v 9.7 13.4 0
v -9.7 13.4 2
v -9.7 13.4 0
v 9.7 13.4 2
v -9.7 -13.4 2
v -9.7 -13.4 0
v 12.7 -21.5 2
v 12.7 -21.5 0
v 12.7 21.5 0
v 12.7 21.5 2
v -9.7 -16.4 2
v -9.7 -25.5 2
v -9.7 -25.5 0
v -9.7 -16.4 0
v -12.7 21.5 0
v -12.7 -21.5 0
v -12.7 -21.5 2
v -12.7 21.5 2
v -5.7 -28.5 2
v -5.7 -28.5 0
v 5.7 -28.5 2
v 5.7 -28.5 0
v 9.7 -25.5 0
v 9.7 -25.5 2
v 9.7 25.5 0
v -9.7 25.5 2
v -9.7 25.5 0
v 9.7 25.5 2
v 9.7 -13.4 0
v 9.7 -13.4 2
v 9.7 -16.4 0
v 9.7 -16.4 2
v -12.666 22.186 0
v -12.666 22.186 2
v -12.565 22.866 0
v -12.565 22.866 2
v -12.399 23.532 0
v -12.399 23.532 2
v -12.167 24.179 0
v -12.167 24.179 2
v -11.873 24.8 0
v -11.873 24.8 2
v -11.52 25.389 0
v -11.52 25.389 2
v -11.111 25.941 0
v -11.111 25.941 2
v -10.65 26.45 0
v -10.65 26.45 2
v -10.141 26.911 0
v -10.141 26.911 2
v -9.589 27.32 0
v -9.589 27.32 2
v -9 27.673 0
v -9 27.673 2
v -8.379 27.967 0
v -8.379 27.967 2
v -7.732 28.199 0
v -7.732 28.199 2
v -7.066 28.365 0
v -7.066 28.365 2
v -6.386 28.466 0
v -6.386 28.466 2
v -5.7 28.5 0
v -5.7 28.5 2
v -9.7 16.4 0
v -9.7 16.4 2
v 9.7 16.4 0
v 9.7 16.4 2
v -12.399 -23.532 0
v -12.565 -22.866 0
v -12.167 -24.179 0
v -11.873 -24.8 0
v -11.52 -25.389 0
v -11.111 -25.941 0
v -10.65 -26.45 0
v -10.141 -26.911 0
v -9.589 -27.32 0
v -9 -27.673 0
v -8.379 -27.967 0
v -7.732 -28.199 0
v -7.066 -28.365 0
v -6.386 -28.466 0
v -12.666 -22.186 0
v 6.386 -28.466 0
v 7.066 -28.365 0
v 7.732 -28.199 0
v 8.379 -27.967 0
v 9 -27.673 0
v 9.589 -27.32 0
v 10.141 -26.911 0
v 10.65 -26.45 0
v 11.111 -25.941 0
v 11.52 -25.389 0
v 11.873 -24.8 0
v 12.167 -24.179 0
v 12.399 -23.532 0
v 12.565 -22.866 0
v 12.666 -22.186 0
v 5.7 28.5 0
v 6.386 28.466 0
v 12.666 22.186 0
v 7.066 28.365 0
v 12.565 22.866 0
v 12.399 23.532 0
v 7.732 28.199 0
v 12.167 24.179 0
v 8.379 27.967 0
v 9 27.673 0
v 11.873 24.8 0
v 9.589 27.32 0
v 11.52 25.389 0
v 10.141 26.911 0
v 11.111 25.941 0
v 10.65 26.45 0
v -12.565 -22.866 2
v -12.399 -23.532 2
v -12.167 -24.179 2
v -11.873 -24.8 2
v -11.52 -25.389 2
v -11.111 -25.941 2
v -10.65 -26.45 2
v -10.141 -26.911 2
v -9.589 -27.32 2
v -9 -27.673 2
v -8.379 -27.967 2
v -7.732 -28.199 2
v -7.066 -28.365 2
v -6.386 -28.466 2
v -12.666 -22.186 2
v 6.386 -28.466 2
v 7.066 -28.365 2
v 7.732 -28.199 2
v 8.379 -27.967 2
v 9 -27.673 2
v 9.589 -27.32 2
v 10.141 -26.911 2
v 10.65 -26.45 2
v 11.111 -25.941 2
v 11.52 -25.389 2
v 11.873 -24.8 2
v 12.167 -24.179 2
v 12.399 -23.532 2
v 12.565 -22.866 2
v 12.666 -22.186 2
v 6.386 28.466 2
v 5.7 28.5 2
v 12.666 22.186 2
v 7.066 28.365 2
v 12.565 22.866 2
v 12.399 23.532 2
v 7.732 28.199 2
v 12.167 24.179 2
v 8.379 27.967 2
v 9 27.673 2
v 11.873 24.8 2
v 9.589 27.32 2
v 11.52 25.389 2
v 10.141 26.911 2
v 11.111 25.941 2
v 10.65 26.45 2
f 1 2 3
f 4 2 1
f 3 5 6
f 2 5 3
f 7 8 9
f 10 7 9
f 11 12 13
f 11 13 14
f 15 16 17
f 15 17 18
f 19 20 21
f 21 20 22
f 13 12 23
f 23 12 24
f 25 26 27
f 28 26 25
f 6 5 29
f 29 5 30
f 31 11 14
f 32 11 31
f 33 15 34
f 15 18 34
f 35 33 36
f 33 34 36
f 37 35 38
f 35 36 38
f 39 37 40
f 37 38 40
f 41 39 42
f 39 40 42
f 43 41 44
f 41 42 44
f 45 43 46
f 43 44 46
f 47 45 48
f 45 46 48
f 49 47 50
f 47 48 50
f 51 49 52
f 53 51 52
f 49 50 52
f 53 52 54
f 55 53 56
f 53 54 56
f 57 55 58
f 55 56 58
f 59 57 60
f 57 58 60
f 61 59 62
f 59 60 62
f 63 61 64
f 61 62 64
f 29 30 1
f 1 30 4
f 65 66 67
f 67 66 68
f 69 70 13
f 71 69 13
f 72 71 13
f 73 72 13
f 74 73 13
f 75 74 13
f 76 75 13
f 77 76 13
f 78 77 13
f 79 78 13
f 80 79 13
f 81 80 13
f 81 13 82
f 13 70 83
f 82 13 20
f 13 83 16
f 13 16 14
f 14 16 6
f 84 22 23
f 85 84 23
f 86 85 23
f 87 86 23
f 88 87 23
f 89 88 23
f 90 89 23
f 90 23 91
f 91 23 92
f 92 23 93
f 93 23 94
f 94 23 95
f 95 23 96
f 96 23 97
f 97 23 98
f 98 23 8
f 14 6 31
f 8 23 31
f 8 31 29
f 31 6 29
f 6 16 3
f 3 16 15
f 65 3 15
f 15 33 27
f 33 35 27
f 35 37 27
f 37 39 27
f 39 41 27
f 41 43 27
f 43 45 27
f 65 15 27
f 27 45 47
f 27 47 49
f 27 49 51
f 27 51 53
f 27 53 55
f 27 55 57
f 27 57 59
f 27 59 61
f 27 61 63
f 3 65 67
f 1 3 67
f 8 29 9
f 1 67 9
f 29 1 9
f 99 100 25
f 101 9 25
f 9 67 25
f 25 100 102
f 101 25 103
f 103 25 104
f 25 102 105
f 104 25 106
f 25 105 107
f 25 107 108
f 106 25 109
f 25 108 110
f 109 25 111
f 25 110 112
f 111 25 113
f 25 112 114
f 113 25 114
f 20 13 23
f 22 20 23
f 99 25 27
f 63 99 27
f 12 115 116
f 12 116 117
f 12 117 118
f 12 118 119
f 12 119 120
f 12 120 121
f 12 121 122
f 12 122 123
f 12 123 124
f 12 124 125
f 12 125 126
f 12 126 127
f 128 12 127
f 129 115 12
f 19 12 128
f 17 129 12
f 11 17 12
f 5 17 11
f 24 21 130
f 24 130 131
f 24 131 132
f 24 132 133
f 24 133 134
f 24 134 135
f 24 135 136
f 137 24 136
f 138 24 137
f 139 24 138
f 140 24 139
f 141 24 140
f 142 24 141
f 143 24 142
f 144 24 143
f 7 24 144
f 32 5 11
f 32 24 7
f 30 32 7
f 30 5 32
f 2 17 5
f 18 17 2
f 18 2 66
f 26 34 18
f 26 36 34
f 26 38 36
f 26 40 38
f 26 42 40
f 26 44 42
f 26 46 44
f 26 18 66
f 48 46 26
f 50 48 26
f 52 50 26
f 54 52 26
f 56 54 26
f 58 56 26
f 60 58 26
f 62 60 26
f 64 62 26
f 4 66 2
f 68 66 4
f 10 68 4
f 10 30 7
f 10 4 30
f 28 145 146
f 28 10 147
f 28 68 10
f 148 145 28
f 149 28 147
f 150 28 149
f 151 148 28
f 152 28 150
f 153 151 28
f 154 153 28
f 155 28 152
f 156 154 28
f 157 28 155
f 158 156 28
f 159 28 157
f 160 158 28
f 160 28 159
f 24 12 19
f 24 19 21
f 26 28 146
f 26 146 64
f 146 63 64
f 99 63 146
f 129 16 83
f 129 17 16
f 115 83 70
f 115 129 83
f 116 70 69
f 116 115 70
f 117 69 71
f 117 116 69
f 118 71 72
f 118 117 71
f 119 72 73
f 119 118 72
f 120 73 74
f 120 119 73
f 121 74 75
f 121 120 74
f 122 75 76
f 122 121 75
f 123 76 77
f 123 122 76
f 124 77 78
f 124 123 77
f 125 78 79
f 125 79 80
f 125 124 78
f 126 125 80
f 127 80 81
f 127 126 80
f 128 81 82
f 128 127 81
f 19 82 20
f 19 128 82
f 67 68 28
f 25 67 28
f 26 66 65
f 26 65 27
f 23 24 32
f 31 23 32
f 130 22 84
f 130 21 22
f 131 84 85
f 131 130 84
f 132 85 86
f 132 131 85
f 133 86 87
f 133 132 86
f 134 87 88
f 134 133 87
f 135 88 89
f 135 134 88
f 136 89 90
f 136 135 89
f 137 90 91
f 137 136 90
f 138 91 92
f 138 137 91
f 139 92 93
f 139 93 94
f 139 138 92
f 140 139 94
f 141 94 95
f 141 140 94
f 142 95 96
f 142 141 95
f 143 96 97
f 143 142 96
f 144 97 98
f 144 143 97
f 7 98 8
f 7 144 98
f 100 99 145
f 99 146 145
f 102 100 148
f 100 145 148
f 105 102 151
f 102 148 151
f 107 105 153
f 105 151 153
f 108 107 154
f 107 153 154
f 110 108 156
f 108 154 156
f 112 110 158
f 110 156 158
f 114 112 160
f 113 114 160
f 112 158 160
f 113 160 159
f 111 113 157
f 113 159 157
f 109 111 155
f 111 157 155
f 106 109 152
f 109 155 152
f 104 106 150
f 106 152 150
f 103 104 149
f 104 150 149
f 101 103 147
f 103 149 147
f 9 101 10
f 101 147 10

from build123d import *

# Parameters (mm, degrees)
F0_W     = 25.4
F0_H     = 57
F1_DEPTH = 2
F2_W     = 19.4
F2_H     = 9.1
F2_H_2   = 26.8
F3_DEPTH = 2.001
F4_R     = 7


with BuildPart() as f1:
    # F0 (on Top) → F1 (new body)
    with BuildSketch(Plane.XY):
        Rectangle(F0_W, F0_H)
    extrude(amount=F1_DEPTH)

    # F2 (on face) → F3 (cut, through all)
    with BuildSketch(Plane.XY.offset(2)):
        with Locations((0, 20.95)):
            Rectangle(F2_W, F2_H)
        Rectangle(F2_W, F2_H_2)
        with Locations((0, -20.95)):
            Rectangle(F2_W, F2_H)
    extrude(amount=-F3_DEPTH, mode=Mode.SUBTRACT)

    # F4
    f4_edges = [f1.edges().sort_by_distance(p)[0] for p in [
        (12.7, 28.5, 1),
        (12.7, -28.5, 1),
        (-12.7, -28.5, 1),
        (-12.7, 28.5, 1),
    ]]
    fillet(f4_edges, radius=F4_R)


solid = f1.part
